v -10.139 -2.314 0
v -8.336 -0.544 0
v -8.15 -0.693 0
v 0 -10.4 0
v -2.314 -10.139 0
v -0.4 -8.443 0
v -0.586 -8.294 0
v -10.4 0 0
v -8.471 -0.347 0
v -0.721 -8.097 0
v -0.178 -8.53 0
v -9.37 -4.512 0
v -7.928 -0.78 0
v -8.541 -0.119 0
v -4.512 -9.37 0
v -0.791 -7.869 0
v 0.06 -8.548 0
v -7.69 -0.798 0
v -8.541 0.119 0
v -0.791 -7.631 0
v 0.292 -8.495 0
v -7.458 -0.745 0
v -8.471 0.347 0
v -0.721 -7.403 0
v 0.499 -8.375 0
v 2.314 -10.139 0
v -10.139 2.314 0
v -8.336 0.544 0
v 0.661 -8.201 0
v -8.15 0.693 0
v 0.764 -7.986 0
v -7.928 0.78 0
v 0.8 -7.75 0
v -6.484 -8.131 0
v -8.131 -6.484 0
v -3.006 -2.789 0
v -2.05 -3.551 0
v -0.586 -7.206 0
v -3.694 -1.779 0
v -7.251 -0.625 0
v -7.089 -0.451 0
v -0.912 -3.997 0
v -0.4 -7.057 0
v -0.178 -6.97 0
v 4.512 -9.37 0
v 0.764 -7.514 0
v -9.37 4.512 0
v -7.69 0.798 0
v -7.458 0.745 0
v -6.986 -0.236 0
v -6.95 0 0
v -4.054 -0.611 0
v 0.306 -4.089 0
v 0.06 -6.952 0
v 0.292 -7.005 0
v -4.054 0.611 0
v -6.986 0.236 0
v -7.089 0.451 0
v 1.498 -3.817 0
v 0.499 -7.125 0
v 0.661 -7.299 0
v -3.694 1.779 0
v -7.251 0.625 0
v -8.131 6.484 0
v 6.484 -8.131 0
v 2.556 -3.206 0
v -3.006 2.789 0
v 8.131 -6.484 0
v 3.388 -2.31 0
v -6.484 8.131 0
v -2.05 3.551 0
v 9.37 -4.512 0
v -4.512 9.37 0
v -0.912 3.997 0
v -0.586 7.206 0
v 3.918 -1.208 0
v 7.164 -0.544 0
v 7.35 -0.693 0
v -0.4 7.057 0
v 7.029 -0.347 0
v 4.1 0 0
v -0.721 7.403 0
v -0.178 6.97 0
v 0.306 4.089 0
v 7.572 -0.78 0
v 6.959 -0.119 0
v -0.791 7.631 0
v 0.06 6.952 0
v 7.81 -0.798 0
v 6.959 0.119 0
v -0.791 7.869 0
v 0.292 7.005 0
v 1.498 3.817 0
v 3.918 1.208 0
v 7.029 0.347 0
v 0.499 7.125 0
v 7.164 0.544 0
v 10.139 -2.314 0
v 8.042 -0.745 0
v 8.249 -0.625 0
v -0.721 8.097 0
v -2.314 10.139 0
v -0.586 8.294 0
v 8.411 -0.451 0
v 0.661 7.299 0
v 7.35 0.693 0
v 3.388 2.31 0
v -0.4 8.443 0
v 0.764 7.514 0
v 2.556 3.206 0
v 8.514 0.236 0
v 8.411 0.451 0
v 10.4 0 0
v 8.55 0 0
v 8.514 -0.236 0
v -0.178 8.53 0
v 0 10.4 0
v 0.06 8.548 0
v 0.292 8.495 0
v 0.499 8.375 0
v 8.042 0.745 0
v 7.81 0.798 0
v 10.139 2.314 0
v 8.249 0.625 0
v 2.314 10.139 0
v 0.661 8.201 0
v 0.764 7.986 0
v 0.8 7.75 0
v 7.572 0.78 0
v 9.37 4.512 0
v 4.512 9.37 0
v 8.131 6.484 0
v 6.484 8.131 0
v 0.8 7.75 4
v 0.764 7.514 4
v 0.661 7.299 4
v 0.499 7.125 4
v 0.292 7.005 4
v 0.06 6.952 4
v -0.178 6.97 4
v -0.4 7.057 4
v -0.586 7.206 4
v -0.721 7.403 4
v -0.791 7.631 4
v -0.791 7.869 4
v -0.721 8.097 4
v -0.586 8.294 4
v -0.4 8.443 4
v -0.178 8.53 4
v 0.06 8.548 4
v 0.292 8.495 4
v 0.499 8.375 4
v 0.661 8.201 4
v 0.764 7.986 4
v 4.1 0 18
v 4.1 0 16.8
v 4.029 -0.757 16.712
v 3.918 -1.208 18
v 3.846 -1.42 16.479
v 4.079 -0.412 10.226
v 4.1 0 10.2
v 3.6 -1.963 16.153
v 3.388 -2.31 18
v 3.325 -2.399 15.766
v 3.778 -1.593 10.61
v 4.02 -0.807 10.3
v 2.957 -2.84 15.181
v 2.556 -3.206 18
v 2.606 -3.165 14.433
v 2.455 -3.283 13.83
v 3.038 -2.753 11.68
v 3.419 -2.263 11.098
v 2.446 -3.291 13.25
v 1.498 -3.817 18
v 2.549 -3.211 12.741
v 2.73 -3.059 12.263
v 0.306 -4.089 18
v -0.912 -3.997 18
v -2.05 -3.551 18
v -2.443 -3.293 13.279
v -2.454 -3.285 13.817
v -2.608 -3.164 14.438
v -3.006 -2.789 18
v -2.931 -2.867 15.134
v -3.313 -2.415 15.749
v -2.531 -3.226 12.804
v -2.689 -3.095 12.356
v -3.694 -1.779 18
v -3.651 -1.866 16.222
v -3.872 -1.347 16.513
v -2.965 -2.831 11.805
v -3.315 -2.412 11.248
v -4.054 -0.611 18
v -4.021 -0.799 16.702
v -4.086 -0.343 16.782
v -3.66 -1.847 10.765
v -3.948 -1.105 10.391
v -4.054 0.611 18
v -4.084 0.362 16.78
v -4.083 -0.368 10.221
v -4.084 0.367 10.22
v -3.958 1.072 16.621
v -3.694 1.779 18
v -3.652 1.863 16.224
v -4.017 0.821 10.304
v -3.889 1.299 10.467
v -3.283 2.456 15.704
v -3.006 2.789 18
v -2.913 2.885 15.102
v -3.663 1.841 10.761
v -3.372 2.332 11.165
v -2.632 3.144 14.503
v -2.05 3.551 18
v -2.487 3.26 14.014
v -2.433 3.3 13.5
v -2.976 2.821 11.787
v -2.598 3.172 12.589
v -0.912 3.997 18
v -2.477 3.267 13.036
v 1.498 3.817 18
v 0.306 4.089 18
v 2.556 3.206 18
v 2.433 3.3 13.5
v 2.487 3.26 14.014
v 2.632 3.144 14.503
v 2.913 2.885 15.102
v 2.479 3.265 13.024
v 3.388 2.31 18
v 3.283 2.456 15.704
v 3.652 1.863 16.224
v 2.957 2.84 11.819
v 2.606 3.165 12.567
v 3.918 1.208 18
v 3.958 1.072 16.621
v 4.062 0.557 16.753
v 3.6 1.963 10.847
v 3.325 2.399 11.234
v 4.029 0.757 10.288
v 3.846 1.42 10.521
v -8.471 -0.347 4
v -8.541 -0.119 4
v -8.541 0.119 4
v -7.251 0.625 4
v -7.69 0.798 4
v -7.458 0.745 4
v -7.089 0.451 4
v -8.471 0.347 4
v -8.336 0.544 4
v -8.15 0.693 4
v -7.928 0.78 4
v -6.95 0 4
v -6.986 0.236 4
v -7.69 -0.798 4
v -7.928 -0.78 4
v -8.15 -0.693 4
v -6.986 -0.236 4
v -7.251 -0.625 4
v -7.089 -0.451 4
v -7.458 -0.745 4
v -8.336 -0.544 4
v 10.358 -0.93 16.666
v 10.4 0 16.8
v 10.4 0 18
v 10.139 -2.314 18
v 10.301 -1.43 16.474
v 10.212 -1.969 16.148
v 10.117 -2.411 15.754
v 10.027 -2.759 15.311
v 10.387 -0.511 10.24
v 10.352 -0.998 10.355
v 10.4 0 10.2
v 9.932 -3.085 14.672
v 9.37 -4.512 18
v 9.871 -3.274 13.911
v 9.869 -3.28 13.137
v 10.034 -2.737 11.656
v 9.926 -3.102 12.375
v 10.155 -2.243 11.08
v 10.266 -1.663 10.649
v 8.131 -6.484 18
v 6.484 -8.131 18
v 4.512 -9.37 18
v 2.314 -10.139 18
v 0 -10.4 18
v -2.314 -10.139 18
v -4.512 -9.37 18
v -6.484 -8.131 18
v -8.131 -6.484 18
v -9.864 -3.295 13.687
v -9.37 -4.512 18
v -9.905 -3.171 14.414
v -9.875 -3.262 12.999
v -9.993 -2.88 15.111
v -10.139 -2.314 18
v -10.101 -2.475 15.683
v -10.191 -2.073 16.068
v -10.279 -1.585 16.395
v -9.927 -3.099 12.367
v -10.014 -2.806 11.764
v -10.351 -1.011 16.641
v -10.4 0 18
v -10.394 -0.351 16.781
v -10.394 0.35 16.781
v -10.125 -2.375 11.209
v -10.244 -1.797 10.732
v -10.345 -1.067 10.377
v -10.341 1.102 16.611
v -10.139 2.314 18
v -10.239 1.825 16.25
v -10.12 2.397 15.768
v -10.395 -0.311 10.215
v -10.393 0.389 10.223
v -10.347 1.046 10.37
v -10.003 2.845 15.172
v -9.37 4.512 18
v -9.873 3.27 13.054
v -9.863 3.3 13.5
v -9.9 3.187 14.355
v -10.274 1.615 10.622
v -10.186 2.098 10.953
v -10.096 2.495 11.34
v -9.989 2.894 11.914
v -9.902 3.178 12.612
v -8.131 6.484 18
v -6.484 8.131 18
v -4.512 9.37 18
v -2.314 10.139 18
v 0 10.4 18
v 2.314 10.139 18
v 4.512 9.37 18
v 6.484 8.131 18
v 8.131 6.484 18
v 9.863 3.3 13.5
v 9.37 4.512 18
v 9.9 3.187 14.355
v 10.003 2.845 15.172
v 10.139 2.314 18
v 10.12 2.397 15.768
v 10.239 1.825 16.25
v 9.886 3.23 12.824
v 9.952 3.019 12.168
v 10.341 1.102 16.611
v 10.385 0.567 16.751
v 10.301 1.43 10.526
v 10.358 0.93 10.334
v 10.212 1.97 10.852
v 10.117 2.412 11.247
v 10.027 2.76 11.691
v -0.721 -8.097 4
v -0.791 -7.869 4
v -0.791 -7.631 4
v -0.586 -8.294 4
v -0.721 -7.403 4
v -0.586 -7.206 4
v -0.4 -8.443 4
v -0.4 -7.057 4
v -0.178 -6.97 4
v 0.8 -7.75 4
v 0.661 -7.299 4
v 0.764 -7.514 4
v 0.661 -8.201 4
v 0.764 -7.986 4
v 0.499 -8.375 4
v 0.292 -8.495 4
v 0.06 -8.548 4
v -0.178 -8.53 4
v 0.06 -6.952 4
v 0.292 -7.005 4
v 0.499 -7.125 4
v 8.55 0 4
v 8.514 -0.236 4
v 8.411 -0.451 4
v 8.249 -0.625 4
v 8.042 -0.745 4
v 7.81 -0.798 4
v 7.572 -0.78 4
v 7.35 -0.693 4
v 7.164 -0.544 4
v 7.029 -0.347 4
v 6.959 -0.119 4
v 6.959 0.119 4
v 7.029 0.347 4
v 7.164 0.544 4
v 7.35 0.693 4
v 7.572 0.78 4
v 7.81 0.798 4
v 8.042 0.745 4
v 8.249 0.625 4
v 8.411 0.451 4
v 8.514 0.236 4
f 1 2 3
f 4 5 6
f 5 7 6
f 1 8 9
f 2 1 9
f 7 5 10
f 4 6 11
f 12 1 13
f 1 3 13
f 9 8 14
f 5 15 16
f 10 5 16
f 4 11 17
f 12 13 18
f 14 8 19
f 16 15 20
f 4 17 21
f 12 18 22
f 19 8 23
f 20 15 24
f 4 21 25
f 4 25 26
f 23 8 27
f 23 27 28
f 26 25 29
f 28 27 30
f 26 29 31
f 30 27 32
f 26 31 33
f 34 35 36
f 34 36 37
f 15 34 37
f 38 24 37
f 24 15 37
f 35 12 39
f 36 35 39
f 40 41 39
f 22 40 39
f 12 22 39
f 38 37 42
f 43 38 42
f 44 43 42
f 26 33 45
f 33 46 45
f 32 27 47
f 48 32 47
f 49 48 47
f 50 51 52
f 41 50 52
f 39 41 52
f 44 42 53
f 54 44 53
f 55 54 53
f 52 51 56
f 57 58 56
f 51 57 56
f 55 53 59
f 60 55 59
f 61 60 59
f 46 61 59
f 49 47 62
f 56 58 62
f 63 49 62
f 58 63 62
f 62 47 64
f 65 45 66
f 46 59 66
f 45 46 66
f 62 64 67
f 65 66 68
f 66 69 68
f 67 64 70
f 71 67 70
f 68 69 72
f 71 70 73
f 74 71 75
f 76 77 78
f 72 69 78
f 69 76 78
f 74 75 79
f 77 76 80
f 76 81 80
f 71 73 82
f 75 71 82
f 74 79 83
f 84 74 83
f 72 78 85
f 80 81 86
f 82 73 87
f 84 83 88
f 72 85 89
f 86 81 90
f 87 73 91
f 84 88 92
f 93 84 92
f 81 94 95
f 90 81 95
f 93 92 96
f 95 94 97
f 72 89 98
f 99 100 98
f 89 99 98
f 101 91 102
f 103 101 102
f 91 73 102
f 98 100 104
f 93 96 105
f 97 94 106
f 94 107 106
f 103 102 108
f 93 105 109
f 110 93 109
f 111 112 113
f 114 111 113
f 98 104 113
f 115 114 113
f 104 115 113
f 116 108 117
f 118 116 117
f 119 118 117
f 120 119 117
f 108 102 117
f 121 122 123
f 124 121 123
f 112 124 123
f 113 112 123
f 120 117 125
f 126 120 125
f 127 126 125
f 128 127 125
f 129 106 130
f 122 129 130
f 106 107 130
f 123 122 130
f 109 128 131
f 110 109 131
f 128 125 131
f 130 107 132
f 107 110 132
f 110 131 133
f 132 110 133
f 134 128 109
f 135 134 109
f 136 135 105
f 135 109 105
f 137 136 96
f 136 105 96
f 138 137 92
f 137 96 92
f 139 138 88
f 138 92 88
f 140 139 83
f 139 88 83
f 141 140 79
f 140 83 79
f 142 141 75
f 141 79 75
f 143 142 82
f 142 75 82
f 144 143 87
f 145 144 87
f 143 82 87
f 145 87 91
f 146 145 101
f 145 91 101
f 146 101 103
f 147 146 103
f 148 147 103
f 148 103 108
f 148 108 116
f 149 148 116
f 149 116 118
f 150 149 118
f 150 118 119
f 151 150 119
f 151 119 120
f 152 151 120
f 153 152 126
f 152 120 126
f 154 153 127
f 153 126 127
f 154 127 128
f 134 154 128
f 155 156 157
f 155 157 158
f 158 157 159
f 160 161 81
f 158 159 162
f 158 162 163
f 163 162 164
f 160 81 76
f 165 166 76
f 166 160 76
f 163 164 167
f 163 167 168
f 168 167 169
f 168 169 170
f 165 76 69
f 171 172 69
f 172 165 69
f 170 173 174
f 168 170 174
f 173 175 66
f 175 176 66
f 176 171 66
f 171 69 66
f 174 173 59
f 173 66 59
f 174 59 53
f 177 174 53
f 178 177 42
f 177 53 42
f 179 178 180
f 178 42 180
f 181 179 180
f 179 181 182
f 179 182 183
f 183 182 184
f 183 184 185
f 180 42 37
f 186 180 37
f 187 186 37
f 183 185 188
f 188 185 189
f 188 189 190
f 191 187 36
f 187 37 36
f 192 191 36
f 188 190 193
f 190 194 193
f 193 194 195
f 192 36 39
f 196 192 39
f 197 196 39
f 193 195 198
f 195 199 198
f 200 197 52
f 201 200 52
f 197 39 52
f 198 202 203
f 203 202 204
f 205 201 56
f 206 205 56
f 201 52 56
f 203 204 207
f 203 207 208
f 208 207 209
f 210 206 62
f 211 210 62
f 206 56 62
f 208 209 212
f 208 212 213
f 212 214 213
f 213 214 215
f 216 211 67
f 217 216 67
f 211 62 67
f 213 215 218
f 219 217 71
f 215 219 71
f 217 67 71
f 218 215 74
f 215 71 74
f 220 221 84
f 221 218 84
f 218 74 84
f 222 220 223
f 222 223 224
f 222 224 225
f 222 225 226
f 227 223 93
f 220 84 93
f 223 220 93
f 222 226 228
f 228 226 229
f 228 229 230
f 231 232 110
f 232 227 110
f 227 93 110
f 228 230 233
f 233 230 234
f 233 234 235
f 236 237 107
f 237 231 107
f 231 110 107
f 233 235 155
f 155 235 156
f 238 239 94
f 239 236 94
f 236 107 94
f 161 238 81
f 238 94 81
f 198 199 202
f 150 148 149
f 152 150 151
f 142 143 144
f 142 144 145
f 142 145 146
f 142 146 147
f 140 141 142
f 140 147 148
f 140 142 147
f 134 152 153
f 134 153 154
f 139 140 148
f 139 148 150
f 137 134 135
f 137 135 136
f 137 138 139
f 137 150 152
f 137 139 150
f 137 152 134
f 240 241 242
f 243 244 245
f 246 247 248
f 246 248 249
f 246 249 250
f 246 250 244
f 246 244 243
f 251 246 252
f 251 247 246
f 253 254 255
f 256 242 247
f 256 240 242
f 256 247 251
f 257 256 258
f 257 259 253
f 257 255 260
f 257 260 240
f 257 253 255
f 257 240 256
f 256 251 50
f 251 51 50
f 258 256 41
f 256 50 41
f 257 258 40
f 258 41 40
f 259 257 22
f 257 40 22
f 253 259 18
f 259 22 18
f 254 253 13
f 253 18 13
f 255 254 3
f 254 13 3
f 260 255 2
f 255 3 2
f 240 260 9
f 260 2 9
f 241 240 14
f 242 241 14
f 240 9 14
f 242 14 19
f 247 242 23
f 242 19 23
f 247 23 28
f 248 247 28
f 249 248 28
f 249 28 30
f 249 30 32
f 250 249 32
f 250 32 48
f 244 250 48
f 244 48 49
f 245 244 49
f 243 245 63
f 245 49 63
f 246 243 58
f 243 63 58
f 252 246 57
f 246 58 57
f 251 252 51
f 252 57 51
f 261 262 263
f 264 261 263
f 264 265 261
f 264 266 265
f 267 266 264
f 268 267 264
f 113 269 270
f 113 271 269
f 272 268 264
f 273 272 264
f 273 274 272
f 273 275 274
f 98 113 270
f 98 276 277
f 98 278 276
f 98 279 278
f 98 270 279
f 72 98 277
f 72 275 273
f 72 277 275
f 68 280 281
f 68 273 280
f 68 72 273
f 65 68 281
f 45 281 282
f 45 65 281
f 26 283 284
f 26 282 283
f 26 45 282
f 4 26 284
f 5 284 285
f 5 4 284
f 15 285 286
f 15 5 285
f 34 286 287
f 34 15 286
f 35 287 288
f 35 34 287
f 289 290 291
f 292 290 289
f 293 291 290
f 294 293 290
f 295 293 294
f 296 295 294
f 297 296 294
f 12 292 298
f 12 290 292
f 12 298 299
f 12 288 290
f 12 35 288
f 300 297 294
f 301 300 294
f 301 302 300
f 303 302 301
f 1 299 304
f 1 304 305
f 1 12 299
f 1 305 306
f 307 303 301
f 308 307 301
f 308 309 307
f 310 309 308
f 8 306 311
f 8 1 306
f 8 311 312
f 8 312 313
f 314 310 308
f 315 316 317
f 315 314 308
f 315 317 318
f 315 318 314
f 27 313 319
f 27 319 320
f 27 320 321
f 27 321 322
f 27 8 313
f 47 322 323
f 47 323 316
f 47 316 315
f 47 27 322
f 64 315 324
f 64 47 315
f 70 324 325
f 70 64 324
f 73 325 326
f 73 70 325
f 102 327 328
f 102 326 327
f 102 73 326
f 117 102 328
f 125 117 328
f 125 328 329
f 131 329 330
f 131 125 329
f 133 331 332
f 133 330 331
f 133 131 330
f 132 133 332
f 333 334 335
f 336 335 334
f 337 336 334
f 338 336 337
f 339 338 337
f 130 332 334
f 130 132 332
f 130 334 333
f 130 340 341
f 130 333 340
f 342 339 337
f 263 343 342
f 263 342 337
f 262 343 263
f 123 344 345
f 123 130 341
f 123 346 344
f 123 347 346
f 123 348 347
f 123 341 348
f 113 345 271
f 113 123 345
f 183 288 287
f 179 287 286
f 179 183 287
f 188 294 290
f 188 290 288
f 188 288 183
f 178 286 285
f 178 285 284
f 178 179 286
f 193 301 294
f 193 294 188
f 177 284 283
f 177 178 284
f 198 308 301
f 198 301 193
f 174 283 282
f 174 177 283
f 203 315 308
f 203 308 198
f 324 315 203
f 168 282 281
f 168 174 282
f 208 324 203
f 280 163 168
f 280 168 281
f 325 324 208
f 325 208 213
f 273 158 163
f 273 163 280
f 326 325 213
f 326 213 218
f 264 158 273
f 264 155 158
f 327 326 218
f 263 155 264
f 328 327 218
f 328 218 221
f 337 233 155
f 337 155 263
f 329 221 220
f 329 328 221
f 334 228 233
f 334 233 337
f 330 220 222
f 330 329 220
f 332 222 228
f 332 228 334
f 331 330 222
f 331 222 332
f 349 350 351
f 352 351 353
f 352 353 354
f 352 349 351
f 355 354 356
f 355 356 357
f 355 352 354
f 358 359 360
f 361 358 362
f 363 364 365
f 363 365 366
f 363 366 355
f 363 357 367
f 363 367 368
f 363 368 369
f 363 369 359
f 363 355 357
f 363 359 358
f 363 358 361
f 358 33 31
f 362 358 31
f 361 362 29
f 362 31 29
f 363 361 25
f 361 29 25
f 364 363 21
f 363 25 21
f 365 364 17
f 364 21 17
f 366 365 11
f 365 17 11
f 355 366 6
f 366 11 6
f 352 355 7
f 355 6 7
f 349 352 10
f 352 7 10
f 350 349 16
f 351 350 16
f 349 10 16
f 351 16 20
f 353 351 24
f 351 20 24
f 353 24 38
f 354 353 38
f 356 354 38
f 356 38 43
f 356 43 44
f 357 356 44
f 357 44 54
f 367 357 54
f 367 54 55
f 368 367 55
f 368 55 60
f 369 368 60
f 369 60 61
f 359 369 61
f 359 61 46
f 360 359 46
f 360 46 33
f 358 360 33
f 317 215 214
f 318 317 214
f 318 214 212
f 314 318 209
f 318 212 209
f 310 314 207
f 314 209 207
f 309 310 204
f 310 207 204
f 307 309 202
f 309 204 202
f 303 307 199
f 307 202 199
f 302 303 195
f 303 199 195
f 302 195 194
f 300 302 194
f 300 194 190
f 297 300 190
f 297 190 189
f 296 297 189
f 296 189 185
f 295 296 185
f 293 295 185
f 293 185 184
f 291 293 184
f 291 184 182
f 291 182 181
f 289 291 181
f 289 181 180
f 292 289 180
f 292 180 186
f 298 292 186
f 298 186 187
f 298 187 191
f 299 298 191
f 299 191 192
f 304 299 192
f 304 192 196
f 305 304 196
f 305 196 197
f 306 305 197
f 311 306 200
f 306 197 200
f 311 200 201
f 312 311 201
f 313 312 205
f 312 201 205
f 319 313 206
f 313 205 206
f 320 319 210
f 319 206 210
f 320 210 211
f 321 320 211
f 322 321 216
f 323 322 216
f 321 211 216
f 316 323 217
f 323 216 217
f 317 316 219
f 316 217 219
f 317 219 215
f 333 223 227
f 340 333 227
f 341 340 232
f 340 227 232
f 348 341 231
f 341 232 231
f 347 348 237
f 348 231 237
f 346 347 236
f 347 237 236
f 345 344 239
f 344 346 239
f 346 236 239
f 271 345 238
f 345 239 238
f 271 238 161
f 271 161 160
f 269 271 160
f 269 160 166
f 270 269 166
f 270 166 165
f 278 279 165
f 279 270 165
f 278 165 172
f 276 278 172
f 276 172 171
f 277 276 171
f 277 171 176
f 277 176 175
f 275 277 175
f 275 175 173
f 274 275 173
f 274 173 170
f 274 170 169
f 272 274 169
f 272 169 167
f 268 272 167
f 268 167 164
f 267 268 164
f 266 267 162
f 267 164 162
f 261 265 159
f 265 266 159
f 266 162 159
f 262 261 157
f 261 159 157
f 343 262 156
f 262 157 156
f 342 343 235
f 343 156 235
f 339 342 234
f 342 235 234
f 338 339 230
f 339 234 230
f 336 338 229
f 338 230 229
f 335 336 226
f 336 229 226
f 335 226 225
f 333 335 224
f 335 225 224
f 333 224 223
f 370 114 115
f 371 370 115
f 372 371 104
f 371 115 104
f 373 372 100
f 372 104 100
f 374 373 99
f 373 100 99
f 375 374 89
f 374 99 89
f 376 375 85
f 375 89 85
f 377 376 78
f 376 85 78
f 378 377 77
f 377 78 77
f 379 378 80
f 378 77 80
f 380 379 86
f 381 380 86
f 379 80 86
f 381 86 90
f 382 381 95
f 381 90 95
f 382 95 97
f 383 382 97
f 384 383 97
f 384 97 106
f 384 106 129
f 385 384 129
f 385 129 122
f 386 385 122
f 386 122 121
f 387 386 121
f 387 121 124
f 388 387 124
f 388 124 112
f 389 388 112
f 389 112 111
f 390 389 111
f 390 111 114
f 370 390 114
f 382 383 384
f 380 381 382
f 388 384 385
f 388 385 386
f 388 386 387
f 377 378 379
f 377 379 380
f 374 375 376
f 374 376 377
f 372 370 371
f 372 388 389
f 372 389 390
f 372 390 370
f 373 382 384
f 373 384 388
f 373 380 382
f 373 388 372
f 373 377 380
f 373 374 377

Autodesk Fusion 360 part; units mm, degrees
sketch "ServoSideBase" plane through (0, 0, 0) normal (0, 0, 1) x (1, 0, 0) in component "ServoSide"
  circle A0 centre (0, 0) radius 10.4
  circle A1 centre (0, 0) radius 4.1
  dimension "d3" = 20.8
  dimension "d4" = 8.2
extrude "ExtrudeServoSideBase" add sketch "ServoSideBase" along normal blind 18 in component "ServoSide"
sketch "ServoScrews" plane through (0, 0, 0) normal (0, 0, -1) x (1, 0, 0) in component "ServoSide"
  circle A0 centre (0, 0) radius 4.1
  circle A1 centre (0, 0) radius 10.4
  line L0 (0, 10.4) -> (0, -10.4) construction
  line L1 (-10.4, 0) -> (10.4, 0) construction
  circle A2 centre (0, 7.75) radius 0.8
  circle A3 centre (-7.75, 0) radius 0.8
  circle A4 centre (0, -7.75) radius 0.8
  circle A5 centre (7.75, 0) radius 0.8
  point P0 (0, 7.75)
  dimension "d7" = 7.75
  dimension "d8" = 1.6
  dimension "d10" = 360
extrude "CutServoScrewHoles" cut sketch "ServoScrews" against normal blind 4 contours A2 | A3 | A4 | A5 in component "ServoSide"
sketch "LargeScrewHole" plane through (0, 0, 0) normal (1, 0, 0) x (0, 1, 0) in component "ServoSide"
  line L0 (0, 18) -> (0, 0) construction
  circle A0 centre (0, 13.5) radius 3.3
  point P0 (0, 18)
  dimension "d41" = 6.6
  dimension "d42" = 4.5
extrude "ExtrudeScrewHole" cut sketch "LargeScrewHole" along normal through all and the other way through all in component "ServoSide"
component "ServoSide" placed x (1, 0, 0) y (0, 1, 0) z (0, 0, 1) at (0, 0, 0)
equation "outside_diam = 20.8 mm"
equation "inside_diam = 8.2 mm"
equation "d3 = outside_diam"
equation "d4 = inside_diam"
equation "d5 = servoside_height"
equation "servoside_height = 18 mm"
equation "slop = 0.1 mm"
equation "neckside_height = 16 mm"
equation "sm_screw_diam = 3.9 mm"
equation "lg_screw_diam = 6.4 mm"
